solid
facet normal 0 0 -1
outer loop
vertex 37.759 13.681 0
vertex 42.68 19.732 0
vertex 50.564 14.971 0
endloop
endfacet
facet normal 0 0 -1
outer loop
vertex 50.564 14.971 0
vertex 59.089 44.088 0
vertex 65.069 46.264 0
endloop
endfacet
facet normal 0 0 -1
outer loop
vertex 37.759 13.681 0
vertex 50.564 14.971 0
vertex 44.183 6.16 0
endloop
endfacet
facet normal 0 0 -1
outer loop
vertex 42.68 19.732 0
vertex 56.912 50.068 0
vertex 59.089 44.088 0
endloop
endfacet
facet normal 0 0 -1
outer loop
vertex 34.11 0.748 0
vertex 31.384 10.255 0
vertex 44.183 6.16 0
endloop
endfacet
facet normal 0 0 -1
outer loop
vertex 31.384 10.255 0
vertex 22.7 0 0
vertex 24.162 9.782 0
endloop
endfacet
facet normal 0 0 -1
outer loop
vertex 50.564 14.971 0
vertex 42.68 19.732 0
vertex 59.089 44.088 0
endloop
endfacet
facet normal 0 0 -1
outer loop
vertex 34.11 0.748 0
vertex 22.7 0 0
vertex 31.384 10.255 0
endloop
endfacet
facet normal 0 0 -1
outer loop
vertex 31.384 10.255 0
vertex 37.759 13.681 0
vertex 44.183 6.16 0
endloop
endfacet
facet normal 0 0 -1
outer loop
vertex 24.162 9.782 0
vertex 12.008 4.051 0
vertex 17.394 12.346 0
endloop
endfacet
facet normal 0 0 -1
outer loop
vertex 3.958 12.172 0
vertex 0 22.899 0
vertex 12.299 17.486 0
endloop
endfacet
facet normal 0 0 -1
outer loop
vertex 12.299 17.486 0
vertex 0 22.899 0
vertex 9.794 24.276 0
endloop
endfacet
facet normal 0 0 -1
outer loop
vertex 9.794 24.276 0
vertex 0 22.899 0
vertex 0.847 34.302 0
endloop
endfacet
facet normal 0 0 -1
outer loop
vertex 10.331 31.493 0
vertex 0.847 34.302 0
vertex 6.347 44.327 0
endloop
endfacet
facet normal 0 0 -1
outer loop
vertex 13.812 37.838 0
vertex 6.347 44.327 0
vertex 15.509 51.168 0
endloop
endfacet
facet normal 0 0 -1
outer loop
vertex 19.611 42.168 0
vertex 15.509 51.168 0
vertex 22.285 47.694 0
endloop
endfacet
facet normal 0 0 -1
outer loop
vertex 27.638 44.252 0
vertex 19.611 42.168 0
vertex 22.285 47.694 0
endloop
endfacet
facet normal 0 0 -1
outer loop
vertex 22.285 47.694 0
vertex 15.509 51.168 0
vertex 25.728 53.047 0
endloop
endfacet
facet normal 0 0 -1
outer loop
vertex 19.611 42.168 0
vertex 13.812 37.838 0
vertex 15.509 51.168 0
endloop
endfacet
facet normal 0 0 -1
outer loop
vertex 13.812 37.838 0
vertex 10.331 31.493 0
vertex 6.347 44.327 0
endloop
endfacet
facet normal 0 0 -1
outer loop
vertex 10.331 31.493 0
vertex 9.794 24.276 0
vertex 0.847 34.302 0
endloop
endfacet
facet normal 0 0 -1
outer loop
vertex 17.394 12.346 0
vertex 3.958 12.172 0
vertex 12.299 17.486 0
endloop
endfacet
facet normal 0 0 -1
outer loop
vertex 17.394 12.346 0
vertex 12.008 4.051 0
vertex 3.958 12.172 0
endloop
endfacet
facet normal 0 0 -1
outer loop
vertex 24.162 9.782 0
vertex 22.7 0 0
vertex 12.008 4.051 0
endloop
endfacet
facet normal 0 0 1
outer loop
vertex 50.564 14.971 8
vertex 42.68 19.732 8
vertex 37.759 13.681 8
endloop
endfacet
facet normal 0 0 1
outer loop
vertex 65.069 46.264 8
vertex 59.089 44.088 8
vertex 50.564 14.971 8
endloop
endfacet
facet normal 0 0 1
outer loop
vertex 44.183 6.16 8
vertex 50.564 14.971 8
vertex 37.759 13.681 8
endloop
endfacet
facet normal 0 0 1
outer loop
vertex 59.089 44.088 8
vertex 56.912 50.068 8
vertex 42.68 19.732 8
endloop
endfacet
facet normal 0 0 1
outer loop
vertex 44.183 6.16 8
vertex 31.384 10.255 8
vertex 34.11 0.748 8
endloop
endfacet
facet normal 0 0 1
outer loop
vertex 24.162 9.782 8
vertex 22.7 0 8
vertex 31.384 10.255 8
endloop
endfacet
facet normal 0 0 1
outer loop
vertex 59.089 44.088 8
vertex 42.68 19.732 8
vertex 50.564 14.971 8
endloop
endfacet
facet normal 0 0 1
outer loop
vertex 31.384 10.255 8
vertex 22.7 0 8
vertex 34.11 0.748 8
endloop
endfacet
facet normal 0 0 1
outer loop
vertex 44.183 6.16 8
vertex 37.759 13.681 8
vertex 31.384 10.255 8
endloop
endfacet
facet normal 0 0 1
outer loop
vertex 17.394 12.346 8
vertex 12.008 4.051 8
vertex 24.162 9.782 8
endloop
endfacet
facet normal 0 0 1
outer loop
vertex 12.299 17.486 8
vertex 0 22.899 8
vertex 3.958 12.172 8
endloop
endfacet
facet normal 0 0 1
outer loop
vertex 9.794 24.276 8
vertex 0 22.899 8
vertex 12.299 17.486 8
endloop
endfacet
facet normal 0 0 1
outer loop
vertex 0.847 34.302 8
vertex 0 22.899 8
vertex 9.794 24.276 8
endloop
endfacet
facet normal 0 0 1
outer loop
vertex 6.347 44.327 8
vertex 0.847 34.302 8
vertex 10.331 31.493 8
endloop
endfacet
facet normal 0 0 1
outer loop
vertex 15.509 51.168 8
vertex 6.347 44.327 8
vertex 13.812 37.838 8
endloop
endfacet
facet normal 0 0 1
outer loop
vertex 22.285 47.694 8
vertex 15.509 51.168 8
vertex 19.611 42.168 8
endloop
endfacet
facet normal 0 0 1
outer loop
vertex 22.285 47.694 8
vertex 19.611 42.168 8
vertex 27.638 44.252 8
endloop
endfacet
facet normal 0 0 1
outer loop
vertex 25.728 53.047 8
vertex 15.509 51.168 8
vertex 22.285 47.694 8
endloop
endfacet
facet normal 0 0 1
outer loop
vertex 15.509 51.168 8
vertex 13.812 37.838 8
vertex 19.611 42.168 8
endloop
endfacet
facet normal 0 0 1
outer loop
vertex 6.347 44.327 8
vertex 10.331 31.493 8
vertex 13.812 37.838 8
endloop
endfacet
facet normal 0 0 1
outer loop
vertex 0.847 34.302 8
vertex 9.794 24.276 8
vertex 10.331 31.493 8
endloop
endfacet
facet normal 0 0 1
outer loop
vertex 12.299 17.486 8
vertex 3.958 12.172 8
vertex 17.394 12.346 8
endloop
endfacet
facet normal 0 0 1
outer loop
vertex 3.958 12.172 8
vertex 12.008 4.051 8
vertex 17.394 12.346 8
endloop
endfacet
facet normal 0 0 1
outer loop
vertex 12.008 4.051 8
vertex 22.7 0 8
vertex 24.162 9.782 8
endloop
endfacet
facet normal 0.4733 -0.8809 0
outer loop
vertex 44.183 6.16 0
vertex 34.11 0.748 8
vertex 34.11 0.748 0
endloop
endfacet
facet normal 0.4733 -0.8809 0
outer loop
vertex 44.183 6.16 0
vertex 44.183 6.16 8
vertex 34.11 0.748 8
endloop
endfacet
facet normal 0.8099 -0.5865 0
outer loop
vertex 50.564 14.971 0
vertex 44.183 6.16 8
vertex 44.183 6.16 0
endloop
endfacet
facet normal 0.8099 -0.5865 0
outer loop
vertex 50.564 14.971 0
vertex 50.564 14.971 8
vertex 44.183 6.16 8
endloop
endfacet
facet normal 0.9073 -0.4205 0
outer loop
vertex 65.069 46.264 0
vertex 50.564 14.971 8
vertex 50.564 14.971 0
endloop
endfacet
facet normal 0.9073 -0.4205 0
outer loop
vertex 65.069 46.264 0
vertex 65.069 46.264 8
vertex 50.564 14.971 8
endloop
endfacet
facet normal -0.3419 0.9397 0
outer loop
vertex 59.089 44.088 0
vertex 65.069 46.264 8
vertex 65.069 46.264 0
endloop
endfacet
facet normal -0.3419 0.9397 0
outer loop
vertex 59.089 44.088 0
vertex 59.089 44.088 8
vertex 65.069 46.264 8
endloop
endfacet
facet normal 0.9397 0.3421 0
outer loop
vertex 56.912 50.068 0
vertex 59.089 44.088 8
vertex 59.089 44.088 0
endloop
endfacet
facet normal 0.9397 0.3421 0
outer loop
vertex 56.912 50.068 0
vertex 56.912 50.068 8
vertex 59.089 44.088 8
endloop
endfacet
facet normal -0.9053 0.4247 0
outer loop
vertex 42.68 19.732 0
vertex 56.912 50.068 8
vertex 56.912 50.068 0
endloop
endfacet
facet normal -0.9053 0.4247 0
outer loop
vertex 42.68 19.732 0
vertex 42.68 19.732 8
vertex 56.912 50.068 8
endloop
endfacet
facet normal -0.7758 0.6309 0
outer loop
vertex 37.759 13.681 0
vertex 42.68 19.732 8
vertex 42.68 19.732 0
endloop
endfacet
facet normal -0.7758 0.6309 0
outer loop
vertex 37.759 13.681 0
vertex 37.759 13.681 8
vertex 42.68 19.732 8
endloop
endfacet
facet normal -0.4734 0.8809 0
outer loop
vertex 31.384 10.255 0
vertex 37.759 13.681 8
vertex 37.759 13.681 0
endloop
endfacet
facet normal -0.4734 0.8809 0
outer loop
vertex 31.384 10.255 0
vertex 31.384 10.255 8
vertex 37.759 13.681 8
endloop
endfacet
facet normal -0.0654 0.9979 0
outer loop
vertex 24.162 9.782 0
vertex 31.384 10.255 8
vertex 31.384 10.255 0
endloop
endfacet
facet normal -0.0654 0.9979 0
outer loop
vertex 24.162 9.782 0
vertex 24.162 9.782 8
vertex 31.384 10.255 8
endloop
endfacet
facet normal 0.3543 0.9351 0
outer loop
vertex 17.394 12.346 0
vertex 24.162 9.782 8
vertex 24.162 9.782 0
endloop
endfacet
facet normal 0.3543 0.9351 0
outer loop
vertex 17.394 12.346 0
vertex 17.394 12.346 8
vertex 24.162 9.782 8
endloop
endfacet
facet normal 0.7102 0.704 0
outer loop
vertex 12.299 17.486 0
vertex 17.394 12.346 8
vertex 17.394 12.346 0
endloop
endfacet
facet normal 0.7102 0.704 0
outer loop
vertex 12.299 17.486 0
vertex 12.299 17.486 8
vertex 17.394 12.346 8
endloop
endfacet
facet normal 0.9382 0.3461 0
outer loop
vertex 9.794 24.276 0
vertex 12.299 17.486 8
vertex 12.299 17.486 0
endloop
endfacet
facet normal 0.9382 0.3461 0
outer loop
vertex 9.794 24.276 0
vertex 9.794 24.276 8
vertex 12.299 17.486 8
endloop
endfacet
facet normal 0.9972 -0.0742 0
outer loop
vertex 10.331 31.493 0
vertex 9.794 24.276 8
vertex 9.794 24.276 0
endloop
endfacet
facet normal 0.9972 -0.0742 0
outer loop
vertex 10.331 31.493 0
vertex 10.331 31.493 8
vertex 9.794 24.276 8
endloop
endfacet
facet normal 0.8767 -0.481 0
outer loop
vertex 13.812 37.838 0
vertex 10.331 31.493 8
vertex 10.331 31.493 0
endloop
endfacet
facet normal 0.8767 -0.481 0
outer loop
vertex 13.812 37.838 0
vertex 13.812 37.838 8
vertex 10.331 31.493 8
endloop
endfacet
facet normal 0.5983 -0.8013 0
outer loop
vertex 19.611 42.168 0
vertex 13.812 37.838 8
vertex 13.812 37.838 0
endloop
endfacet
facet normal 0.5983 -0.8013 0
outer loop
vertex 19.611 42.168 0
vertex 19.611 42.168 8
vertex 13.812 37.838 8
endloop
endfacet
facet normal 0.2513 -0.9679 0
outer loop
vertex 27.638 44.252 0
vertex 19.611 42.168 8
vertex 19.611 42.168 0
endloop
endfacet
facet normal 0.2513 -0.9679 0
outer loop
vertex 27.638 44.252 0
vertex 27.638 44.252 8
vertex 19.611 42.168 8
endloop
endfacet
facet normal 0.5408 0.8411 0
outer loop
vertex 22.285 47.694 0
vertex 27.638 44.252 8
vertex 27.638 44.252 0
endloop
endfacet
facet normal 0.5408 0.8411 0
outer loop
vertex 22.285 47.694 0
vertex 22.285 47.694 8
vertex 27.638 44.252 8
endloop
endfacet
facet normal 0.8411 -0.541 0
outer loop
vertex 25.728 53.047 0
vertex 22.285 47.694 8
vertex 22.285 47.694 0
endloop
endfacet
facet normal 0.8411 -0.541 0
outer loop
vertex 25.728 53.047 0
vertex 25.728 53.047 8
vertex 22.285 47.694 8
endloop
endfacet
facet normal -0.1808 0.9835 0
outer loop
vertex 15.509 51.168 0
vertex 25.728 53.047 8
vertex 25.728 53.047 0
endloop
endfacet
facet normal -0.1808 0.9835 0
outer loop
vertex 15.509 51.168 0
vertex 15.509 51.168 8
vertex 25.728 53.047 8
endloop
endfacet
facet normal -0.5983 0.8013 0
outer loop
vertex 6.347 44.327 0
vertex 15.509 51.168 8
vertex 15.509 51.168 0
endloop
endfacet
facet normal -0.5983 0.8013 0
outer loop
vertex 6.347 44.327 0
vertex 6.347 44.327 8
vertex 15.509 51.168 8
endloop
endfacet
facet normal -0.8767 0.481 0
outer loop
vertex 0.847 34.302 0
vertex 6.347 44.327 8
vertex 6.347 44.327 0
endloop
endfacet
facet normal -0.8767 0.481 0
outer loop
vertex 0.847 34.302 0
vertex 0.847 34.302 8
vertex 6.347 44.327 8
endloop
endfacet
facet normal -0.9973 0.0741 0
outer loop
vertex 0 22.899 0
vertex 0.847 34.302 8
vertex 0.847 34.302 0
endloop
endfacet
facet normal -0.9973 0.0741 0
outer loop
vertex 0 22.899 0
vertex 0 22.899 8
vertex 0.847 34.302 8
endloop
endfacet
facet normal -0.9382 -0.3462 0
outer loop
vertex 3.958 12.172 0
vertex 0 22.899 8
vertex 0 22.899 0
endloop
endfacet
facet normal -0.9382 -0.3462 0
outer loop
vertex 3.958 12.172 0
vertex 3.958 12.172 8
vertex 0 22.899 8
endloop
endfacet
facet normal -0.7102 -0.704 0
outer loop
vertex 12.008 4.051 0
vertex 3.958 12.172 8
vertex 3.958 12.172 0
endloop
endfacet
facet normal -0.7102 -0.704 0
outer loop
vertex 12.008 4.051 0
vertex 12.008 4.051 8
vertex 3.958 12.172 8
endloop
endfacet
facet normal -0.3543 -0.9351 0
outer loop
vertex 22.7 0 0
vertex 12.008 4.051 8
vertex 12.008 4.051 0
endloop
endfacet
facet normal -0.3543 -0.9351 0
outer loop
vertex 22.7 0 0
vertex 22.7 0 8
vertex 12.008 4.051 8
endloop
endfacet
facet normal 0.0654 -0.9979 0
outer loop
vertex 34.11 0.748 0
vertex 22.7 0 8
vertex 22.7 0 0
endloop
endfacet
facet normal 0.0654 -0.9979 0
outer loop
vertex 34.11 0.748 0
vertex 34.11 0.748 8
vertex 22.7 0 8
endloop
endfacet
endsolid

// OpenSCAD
$fn = 32;

// ----------------------------------------------------------------------
// Hook plate: curl radius 22 mm over 245 degrees, 9 mm thick band
// ----------------------------------------------------------------------

// --- parameters (mm) ---
profile_height = 8;       // extrusion height
profile_points = 26;      // points of the closed outline

profile = [[22.285, 47.694], [25.728, 53.047], [15.509, 51.168], [6.347, 44.327], [0.847, 34.302], [0, 22.899], [3.958, 12.172], [12.008, 4.051], [22.7, 0], [34.11, 0.748], [44.183, 6.16], [50.564, 14.971], [65.069, 46.264], [59.089, 44.088], [56.912, 50.068], [42.68, 19.732], [37.759, 13.681], [31.384, 10.255], [24.162, 9.782], [17.394, 12.346], [12.299, 17.486], [9.794, 24.276], [10.331, 31.493], [13.812, 37.838], [19.611, 42.168], [27.638, 44.252]];  // single closed polygon, 26 points, counter clockwise

// --- the one profile operation ---
linear_extrude(height = profile_height) polygon(points = profile);
